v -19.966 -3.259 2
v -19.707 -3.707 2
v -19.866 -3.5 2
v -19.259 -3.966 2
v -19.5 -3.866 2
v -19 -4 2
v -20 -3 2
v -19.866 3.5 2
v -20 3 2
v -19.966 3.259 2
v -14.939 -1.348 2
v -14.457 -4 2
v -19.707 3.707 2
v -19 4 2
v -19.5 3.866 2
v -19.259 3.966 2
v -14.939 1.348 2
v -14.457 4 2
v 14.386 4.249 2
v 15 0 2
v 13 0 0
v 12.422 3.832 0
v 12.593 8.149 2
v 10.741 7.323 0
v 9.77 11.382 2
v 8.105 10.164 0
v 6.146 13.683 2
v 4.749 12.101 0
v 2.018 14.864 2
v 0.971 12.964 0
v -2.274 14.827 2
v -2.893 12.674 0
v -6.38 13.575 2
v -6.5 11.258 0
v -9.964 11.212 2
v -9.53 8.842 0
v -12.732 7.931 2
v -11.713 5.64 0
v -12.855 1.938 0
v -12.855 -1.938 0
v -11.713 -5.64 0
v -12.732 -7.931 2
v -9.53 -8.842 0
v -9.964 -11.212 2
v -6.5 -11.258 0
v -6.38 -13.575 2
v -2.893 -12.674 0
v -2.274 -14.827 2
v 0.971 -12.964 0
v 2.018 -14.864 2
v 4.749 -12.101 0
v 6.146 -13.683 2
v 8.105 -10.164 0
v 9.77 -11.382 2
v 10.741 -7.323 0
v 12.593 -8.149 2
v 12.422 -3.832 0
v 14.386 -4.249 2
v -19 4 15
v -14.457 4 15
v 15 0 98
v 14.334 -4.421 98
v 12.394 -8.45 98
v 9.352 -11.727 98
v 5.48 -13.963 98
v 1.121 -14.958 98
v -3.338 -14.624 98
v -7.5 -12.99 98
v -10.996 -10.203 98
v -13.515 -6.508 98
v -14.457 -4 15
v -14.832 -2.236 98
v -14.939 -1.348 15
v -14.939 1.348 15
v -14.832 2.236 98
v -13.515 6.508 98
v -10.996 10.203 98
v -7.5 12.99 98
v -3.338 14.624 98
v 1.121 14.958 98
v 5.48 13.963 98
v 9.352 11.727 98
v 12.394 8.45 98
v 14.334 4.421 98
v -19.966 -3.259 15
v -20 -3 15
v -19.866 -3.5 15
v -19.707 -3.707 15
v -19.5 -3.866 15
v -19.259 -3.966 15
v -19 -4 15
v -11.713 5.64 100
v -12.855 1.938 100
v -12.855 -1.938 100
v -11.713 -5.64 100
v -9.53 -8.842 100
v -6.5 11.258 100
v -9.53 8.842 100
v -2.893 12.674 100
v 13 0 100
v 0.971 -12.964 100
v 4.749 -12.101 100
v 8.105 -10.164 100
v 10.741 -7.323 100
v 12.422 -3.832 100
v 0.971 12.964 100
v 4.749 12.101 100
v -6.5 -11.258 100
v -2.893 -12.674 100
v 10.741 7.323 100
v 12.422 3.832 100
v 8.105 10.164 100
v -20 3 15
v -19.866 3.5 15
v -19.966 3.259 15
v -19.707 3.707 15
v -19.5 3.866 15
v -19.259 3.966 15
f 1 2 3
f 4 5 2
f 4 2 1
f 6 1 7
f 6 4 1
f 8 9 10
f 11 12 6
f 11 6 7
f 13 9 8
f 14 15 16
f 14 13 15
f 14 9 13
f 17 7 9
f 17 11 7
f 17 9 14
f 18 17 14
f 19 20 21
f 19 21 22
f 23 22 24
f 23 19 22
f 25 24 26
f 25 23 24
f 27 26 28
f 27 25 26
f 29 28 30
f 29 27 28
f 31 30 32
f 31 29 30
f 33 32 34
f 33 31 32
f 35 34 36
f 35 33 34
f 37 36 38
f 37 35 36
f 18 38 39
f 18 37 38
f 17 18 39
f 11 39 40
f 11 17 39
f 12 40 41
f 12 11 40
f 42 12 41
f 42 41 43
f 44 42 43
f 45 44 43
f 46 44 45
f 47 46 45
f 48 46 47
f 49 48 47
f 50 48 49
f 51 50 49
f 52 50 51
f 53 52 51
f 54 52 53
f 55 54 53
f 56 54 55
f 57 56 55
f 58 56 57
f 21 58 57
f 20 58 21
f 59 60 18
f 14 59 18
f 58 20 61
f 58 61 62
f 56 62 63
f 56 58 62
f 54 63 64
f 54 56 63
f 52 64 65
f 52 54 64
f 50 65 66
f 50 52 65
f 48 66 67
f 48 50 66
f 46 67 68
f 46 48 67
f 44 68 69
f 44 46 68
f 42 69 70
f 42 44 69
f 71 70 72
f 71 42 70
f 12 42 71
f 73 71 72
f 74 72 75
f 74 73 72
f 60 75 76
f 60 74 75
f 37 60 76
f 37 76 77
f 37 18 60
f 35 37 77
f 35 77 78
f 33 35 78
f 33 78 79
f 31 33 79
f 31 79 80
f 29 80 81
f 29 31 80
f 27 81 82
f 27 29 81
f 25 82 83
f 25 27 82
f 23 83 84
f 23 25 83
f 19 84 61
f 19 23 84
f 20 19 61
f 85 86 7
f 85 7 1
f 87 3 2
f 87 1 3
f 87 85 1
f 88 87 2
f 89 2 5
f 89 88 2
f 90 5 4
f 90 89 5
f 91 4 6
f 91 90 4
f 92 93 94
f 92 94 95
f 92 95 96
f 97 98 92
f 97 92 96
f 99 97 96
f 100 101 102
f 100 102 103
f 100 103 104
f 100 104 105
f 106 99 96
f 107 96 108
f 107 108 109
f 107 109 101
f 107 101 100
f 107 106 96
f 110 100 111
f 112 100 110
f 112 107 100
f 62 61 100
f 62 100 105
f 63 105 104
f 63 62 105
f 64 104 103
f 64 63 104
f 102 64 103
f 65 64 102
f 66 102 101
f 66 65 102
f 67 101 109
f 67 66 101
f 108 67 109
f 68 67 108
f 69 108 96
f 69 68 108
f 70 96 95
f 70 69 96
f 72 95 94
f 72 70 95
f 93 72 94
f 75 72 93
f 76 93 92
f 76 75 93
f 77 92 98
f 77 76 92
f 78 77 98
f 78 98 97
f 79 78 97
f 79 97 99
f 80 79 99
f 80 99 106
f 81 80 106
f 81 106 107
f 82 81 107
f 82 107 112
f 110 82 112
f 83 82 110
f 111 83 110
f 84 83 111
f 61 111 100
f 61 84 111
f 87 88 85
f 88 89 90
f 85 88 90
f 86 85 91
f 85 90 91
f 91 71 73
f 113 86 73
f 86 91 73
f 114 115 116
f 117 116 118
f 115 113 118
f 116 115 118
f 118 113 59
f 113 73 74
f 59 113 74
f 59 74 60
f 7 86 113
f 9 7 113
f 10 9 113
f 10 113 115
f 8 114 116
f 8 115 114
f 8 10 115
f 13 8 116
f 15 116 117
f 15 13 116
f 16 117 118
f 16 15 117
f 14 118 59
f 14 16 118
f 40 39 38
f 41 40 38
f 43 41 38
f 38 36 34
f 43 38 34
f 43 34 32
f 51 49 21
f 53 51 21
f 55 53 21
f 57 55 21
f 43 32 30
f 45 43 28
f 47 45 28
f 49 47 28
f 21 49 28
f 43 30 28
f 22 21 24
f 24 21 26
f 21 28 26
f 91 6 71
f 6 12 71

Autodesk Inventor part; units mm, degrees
ref_plane "XZ Plane" through (0, 0, 0) normal (0, 1, 0) x (-1, 0, 0)
ref_plane "XY Plane" through (0, 0, 0) normal (0, 0, 1) x (1, 0, 0)
sketch "Sketch1" plane through (0, 0, 0) normal (0, 0, 1) x (1, 0, 0)
  circle A0 centre (0, 0) radius 15
  dimension "d0" = 30
extrude "Extrusion1" add sketch "Sketch1" along normal blind 100
chamfer "Chamfer1" distance 2 angle 45 1 edges at (-15, 0, 100)
chamfer "Chamfer2" distance 2 angle 45 1 edges at (-15, 0, 0)
ref_plane "Work Plane1" through (-10, 0, 0) normal (1, 0, 0) x (0, 1, 0)
sketch "Sketch2" plane through (-10, 0, 0) normal (1, 0, 0) x (0, 1, 0)
  line L0 (-15, 2) -> (15, 2) projected
  line L1 (4, 2) -> (-4, 2)
  line L2 (-4, 2) -> (-4, 15)
  line L3 (-4, 15) -> (4, 15)
  line L4 (4, 15) -> (4, 2)
  line L5 (4, 2) -> (-4, 15) construction
  line L6 (-4, 2) -> (4, 15) construction
  line L7 (0, -20) -> (0, 120) projected
  line L8 (15, 98) -> (-15, 98) projected
  line L9 (-15, 2) -> (15, 2) projected
  line L10 (-15, 2) -> (-15, 98) projected
  line L11 (15, 2) -> (15, 98) projected
  point P0 (0, 0)
  point P1 (0, 8.5)
  dimension "d10" = 8
  dimension "d11" = 13
  dimension "d12" = 15
extrude "Extrusion2" add sketch "Sketch2" against normal blind 10 contours L2 L3 L7 L0 | L7 L3 L4 L0
fillet "Fillet1" radius 1 2 edges at (-20, 4, 8.5) (-20, -4, 8.5)
properties part number "Shaft" material "Lead"
